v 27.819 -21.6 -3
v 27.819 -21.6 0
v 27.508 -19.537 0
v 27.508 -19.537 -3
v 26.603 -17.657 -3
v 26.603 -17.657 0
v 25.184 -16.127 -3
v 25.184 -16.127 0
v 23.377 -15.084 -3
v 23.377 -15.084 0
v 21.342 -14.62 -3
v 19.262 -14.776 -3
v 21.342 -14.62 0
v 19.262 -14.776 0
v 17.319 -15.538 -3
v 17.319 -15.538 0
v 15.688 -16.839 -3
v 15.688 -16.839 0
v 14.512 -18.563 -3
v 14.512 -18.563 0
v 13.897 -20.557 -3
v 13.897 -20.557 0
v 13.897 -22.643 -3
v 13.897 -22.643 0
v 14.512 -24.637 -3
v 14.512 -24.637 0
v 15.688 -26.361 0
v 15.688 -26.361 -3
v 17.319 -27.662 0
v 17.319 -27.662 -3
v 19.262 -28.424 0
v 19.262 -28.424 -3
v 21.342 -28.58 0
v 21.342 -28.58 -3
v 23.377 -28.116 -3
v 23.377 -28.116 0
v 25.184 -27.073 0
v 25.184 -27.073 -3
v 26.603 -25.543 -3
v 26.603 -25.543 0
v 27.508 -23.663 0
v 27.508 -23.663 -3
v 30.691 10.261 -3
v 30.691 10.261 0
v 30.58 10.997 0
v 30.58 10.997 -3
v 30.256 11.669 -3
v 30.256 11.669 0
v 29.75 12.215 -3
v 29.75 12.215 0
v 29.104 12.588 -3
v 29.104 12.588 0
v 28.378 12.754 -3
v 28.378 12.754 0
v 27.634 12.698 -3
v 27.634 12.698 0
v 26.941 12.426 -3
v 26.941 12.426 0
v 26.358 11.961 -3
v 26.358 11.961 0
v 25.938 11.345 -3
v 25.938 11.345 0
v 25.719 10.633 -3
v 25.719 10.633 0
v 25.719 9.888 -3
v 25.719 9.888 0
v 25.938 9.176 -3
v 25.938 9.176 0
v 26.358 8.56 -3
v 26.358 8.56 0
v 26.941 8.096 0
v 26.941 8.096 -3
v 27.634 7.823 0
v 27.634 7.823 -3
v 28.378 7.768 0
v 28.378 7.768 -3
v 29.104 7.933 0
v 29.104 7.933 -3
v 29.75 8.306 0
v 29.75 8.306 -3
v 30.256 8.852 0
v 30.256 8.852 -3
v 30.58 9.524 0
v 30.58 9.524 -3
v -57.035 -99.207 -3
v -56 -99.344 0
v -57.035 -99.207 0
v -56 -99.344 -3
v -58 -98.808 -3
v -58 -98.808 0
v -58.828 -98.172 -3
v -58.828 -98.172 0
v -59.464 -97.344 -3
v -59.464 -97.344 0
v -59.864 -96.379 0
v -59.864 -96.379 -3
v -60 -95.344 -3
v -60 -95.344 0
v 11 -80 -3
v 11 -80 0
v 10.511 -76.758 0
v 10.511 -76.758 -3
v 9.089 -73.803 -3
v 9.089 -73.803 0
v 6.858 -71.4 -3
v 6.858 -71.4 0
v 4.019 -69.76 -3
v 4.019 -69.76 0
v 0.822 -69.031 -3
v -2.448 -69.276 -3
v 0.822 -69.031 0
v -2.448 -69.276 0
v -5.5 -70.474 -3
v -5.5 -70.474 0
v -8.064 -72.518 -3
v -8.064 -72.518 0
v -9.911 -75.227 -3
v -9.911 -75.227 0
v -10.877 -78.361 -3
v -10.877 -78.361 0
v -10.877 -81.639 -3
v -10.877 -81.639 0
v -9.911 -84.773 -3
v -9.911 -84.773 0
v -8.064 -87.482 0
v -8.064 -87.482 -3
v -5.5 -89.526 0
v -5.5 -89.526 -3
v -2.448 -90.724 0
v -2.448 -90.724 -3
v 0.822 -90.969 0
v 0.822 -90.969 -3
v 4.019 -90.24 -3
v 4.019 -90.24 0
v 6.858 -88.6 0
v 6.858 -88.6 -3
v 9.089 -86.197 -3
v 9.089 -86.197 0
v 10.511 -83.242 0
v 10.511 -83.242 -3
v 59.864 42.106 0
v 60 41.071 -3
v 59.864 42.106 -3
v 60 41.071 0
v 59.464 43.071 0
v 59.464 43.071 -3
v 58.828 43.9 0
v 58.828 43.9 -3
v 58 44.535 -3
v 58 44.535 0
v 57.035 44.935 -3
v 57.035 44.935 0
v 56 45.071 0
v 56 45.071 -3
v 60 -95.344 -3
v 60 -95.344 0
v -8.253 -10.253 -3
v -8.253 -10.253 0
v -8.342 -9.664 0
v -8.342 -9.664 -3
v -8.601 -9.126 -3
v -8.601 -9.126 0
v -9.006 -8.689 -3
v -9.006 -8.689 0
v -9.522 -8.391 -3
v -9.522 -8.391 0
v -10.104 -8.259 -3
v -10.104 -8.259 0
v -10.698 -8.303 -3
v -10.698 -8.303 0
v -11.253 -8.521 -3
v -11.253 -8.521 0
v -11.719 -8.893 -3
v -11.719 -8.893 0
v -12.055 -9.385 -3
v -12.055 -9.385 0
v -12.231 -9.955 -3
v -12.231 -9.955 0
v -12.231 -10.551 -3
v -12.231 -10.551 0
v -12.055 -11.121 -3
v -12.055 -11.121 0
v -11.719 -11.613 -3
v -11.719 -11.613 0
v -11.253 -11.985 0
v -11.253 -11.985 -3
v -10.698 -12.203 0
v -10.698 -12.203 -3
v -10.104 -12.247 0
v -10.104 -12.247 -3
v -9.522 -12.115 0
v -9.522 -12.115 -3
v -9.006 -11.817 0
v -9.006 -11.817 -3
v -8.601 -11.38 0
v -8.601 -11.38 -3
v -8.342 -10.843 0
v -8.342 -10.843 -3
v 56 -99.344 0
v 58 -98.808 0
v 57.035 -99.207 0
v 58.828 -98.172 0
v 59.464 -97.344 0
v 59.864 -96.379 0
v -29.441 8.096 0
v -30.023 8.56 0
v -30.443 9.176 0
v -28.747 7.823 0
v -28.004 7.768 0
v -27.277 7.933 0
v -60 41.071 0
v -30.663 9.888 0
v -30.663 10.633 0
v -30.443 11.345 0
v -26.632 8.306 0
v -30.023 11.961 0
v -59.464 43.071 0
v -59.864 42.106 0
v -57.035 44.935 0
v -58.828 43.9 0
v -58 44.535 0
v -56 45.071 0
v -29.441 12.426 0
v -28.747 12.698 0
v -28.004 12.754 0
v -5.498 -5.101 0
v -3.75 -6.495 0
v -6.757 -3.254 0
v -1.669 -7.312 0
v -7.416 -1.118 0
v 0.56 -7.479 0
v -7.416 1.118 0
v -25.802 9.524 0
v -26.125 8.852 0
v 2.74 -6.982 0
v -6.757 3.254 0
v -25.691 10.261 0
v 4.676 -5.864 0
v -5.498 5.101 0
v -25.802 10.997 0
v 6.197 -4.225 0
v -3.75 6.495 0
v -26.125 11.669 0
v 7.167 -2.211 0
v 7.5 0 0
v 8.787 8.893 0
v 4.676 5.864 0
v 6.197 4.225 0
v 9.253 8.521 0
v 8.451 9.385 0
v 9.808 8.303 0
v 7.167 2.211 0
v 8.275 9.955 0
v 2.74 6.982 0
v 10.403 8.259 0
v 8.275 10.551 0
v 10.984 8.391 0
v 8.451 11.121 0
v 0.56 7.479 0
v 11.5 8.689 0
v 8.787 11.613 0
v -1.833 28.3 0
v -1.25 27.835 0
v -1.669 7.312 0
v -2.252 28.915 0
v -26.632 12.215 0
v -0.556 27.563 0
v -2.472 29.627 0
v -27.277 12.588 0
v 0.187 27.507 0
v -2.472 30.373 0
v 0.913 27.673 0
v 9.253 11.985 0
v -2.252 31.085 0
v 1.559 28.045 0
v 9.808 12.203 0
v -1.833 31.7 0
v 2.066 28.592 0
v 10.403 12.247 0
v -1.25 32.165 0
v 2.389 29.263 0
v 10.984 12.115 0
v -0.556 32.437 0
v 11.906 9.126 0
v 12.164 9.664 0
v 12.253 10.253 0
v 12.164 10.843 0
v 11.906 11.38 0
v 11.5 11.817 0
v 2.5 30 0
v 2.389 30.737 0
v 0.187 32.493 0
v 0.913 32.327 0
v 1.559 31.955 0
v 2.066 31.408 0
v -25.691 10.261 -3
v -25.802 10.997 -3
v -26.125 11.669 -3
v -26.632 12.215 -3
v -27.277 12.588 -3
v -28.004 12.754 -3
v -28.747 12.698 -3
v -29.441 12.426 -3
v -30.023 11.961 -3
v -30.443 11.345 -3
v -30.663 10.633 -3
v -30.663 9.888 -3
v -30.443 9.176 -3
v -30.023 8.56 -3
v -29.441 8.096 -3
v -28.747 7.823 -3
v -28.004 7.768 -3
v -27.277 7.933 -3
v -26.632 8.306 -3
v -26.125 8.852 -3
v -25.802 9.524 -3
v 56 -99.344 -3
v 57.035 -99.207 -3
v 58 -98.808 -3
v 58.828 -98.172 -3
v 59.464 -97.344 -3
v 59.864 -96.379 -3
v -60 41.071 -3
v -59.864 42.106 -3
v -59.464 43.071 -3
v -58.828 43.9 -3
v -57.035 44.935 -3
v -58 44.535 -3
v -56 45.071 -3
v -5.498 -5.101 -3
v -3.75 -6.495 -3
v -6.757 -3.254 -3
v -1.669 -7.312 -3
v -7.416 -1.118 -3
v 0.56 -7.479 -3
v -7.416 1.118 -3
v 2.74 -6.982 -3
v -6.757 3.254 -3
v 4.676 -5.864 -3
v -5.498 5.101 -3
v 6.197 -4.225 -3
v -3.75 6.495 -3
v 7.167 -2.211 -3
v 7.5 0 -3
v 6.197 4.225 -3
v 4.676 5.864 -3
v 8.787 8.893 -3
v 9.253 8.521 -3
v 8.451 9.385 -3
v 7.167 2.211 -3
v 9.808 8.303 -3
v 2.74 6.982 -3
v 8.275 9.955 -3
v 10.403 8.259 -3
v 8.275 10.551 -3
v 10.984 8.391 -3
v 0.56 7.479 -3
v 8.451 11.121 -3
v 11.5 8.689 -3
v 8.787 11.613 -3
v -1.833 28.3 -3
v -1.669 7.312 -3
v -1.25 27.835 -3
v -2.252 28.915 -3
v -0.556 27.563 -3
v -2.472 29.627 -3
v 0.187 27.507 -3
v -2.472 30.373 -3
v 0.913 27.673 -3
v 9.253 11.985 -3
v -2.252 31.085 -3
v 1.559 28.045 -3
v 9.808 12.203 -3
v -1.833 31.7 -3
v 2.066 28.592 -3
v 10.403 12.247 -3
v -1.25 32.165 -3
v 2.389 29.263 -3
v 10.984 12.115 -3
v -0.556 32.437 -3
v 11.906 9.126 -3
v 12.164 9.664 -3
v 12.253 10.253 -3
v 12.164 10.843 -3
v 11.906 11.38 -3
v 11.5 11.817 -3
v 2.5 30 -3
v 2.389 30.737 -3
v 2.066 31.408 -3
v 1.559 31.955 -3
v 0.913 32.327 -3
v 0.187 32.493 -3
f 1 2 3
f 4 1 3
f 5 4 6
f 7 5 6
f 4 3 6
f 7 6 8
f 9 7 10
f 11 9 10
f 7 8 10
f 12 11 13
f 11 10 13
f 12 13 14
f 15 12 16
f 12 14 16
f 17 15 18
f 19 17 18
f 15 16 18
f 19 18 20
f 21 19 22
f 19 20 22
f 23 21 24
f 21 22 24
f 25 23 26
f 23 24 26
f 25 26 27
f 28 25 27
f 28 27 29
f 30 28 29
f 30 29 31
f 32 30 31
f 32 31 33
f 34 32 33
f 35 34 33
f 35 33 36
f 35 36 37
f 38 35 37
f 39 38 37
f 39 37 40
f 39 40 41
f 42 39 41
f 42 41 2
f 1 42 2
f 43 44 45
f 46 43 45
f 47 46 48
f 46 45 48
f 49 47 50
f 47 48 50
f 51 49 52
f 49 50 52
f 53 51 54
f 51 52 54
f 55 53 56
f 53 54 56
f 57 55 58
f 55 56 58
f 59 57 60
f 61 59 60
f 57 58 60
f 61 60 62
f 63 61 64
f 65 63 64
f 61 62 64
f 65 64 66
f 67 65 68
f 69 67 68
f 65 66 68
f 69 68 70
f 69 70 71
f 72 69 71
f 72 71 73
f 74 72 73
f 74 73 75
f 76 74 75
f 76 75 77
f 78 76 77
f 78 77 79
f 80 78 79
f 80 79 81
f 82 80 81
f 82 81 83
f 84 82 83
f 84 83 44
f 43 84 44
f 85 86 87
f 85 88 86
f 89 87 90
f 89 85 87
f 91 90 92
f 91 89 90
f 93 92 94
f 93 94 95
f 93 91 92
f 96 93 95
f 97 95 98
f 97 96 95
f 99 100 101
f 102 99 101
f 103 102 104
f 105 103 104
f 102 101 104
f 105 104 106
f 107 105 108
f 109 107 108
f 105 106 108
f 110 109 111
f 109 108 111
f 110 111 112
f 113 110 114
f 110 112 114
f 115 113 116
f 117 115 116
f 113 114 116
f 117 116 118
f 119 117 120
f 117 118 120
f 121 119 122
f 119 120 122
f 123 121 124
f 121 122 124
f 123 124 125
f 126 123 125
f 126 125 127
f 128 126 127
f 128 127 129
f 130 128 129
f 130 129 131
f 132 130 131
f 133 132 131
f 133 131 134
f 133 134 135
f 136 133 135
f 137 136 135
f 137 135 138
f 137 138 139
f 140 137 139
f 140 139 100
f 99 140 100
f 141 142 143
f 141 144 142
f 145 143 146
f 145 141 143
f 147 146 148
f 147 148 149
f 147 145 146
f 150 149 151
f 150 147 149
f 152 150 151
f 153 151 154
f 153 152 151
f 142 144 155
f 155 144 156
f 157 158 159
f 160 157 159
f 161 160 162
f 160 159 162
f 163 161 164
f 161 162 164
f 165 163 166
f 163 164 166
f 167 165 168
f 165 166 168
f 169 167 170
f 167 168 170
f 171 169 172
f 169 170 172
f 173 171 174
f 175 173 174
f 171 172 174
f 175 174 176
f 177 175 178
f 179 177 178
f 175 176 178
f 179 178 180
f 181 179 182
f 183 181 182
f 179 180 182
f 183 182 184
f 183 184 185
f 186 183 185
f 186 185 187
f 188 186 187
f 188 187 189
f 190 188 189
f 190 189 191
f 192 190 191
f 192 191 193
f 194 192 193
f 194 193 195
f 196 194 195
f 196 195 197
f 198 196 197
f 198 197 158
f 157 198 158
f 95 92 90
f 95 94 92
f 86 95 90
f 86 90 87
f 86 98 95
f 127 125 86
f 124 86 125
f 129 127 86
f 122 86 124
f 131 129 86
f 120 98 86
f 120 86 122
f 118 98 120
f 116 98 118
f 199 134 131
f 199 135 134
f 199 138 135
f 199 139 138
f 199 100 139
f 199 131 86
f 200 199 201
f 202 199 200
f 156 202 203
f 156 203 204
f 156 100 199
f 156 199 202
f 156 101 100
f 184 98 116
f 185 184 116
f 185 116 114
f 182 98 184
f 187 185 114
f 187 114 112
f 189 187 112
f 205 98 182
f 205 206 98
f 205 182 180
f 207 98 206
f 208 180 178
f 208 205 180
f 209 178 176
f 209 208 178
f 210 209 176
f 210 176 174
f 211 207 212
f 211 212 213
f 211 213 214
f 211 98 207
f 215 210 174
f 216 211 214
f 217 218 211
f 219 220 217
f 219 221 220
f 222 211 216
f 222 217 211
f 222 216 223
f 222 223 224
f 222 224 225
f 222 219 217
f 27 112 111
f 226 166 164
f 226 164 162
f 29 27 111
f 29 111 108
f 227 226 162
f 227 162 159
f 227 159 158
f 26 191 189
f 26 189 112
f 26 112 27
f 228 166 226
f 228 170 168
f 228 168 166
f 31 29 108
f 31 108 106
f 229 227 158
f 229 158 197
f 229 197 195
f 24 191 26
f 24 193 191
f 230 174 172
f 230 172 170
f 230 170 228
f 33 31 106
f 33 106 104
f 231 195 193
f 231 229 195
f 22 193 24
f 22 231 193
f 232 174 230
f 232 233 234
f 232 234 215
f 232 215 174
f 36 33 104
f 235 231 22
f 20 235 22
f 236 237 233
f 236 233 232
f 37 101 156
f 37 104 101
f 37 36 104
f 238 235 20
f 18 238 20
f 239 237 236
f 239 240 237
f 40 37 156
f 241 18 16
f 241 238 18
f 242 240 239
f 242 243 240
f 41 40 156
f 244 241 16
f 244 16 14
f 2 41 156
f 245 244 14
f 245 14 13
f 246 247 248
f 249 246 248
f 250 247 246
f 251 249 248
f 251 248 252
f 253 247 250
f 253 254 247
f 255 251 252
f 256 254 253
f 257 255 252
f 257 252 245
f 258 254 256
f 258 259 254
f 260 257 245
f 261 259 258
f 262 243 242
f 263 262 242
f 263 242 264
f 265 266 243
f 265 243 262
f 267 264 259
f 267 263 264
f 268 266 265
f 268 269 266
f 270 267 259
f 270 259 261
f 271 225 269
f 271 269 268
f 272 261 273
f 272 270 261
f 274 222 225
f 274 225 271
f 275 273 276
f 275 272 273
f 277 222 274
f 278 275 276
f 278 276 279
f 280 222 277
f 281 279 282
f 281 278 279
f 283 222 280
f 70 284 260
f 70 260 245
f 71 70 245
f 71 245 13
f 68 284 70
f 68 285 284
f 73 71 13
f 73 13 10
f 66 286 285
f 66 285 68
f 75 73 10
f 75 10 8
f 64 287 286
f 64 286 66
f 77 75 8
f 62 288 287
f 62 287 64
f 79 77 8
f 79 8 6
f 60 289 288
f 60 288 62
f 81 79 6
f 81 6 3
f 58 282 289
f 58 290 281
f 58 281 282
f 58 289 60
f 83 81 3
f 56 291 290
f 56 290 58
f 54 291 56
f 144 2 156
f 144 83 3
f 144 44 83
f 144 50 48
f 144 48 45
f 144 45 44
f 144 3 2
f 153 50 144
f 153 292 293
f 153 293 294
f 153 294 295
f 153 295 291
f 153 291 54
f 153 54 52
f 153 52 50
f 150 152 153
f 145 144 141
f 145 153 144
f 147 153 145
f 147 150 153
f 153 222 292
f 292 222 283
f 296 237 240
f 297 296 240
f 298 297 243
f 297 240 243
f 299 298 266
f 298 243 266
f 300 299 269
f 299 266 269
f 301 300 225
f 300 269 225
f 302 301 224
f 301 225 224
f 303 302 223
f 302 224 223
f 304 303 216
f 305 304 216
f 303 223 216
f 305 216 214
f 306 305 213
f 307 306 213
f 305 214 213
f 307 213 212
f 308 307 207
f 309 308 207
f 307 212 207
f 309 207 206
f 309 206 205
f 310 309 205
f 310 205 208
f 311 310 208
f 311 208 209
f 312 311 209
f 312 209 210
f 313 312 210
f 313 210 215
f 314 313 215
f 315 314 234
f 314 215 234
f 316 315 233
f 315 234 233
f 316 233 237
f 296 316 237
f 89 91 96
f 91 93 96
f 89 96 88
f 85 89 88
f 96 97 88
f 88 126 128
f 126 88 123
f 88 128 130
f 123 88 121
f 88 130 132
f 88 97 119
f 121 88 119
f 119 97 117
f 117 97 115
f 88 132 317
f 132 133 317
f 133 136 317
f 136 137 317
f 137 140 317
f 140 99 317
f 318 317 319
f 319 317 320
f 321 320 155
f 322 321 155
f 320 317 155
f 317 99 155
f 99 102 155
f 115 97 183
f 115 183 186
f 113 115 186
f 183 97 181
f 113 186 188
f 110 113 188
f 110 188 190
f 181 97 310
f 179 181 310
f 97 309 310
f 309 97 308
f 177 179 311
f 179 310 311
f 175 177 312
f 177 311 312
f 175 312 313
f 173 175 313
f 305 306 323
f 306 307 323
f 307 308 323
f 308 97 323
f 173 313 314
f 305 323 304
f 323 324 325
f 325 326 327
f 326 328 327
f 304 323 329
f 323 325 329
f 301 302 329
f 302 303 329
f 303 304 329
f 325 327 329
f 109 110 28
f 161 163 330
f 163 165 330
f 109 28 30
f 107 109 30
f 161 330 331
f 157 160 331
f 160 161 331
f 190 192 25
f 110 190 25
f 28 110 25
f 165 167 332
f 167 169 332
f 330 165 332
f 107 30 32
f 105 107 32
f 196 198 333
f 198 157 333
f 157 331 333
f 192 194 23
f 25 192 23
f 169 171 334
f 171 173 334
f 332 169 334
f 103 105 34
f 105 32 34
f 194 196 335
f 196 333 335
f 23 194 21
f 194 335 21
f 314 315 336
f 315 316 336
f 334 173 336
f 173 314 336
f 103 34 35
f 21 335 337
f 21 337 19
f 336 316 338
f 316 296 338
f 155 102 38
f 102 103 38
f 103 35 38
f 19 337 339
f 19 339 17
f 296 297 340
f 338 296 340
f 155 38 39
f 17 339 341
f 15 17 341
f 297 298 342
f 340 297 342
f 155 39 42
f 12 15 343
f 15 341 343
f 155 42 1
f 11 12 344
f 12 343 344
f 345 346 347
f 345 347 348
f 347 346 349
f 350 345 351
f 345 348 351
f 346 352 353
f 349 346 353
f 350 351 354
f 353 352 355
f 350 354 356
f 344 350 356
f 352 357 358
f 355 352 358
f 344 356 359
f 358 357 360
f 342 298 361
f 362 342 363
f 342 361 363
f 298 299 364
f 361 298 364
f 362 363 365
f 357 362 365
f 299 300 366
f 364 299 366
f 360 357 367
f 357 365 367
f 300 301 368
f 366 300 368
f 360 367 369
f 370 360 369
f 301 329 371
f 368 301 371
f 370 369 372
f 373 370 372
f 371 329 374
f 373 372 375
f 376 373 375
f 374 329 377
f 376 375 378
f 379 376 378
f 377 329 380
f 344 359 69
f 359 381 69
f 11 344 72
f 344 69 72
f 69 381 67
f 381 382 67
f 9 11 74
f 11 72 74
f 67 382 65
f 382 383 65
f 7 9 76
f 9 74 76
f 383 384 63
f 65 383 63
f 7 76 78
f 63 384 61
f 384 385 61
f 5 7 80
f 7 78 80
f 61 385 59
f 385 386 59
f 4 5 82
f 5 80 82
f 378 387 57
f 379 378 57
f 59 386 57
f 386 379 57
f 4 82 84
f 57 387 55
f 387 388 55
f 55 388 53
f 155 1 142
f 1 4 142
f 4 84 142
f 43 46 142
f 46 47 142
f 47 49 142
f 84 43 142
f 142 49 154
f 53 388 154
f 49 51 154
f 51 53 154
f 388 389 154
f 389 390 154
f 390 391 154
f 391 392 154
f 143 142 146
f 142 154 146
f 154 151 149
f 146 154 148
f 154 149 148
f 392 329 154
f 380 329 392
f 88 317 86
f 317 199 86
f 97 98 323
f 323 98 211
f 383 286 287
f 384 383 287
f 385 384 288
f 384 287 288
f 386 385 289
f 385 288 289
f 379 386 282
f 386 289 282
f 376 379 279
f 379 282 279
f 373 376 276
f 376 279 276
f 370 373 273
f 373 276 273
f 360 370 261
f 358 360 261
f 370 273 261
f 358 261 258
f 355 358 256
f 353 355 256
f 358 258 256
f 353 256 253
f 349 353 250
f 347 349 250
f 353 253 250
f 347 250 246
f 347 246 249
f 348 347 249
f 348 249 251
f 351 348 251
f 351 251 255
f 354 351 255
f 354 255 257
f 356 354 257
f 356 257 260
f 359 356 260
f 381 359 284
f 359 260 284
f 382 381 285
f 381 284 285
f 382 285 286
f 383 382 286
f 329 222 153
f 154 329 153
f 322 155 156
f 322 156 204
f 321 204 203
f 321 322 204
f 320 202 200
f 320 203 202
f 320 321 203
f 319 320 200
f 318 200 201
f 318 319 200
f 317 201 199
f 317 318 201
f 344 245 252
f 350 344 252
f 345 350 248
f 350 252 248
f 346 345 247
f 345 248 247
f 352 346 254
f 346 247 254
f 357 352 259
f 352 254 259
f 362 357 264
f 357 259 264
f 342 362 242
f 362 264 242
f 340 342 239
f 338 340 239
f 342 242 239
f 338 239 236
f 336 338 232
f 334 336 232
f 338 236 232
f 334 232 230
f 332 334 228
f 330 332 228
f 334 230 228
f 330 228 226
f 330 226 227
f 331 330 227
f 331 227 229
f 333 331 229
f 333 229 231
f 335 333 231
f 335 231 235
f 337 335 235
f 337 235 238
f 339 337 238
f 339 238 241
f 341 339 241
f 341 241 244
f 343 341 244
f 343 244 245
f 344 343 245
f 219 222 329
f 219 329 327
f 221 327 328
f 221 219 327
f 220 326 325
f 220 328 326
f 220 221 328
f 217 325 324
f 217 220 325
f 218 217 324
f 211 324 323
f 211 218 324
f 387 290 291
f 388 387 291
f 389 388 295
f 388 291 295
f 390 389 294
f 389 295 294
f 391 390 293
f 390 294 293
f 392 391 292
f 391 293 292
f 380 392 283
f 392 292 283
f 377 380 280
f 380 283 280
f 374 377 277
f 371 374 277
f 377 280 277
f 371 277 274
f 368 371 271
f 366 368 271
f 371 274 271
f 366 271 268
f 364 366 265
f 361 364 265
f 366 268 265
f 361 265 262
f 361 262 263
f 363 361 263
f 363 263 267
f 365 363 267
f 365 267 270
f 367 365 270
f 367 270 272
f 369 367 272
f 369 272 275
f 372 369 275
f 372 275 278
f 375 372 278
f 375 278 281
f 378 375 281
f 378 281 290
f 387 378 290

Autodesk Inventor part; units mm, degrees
ref_plane "YZ Plane" through (0, 0, 0) normal (1, 0, 0) x (0, 1, 0)
ref_plane "XZ Plane" through (0, 0, 0) normal (0, 1, 0) x (-1, 0, 0)
ref_plane "XY Plane" through (0, 0, 0) normal (0, 0, 1) x (1, 0, 0)
sketch "スケッチ1" plane through (0, 0, 0) normal (0, 0, 1) x (1, 0, 0)
  circle A0 centre (0, 0) radius 21.2
  circle A1 centre (0, 0) radius 7.5
  circle A2 centre (0, 0) radius 30
  circle A3 centre (20.819222, -21.6) radius 22.5
  circle A4 centre (20.819222, -21.6) radius 14
  circle A5 centre (20.819222, -21.6) radius 62
  circle A6 centre (0, -80) radius 48
  circle A7 centre (0, -80) radius 50
  circle A8 centre (20.819222, -21.6) radius 4
  circle A9 centre (0, -80) radius 5
  dimension "d2" = 60
  dimension "d4" = 124
  dimension "d0" = 42.4
  dimension "d1" = 15
  dimension "d3" = 28
  dimension "d5" = 100
  dimension "d23" = 8
  dimension "d24" = 10
sketch "スケッチ2" plane through (0, 0, 0) normal (0, 0, 1) x (1, 0, 0)
  line L0 (0, 0) -> (24.501973, 0) construction
  line L1 (0, 0) -> (12.5, 0) construction
  line L2 (0, 0) -> (10.253048, 10.253048)
  line L3 (0, 0) -> (14.5, 0) construction
  line L4 (10.253048, 10.253048) -> (-10.253048, -10.253048)
  circle A0 centre (10.253048, 10.253048) radius 2
  circle A1 centre (-10.253048, -10.253048) radius 2
  circle A2 centre (0, 0) radius 7.5
  line L5 (0, 0) -> (28.190779, 10.260604)
  line L6 (0, 0) -> (30, 0) construction
  line L7 (0, 0) -> (-28.190779, 10.260604)
  line L8 (0, 0) -> (30, 0) construction
  circle A3 centre (-28.190779, 10.260604) radius 2.5
  line L9 (0, 0) -> (0, 30)
  circle A4 centre (0, 30) radius 2.5
  circle A5 centre (28.190779, 10.260604) radius 2.5
  dimension "d9" = 14.5
  dimension "d10" = 45
  dimension "d11" = 29
  dimension "d12" = 4
  dimension "d13" = 4
  dimension "d14" = 15
  dimension "d15" = 30
  dimension "d16" = 20
  dimension "d17" = 30
  dimension "d18" = 160
  dimension "d19" = 5
  dimension "d20" = 30
  dimension "d21" = 5
  dimension "d22" = 5
sketch "スケッチ3" plane through (0, 0, 0) normal (0, 0, 1) x (1, 0, 0)
  line L0 (60, -99.343647) -> (-60, -99.343647)
  line L1 (-60, -99.343647) -> (-60, 99.343647)
  line L2 (-60, 99.343647) -> (60, 99.343647)
  line L3 (60, 99.343647) -> (60, -99.343647)
  line L4 (60, -99.343647) -> (-60, 99.343647) construction
  line L5 (-60, -99.343647) -> (60, 99.343647) construction
  point P0 (0, 0)
  dimension "d25" = 120
extrude "押し出し1" add sketch "スケッチ3" against normal blind 3
extrude "押し出し2" cut sketch "スケッチ2" against normal blind 3
extrude "押し出し3" cut sketch "スケッチ1" against normal blind 3 contours A8 A2 | A2 A8 | A9 A5 | A5 A9
sketch "スケッチ4" plane through (0, 0, 0) normal (0, 0, 1) x (1, 0, 0)
  line L0 (0, 45.071117) -> (68.359536, 45.071117)
  line L1 (68.359536, 45.071117) -> (-74.382402, 45.071117)
  line L2 (-74.382402, 45.071117) -> (108.165644, 45.071117)
  line L3 (108.165644, 45.071117) -> (108.165644, 129.415375)
  line L4 (108.165644, 129.415375) -> (-74.382402, 129.415375)
  line L5 (-74.382402, 129.415375) -> (-74.382402, 45.071117)
  point P0 (0, 0)
extrude "押し出し4" cut sketch "スケッチ4" against normal blind 10
fillet "フィレット1" radius 4 4 edges at (-60, 45.0711, -1.5) (60, 45.0711, -1.5) (-60, -99.3436, -1.5) (60, -99.3436, -1.5)
sketch "スケッチ5" plane through (0, 0, 0) normal (0, 0, 1) x (1, 0, 0)
  circle A0 centre (0, -80) radius 5 projected
  circle A1 centre (0, -80) radius 11
  point P0 (0, 0)
  dimension "d35" = 22
extrude "押し出し5" cut sketch "スケッチ5" against normal blind 10
sketch "スケッチ6" plane through (0, 0, 0) normal (0, 0, 1) x (1, 0, 0)
  circle A0 centre (20.819222, -21.6) radius 4
  circle A1 centre (20.819222, -21.6) radius 7
  point P0 (0, 0)
  dimension "d38" = 14
extrude "押し出し6" cut sketch "スケッチ6" against normal through all
properties part number "板"
